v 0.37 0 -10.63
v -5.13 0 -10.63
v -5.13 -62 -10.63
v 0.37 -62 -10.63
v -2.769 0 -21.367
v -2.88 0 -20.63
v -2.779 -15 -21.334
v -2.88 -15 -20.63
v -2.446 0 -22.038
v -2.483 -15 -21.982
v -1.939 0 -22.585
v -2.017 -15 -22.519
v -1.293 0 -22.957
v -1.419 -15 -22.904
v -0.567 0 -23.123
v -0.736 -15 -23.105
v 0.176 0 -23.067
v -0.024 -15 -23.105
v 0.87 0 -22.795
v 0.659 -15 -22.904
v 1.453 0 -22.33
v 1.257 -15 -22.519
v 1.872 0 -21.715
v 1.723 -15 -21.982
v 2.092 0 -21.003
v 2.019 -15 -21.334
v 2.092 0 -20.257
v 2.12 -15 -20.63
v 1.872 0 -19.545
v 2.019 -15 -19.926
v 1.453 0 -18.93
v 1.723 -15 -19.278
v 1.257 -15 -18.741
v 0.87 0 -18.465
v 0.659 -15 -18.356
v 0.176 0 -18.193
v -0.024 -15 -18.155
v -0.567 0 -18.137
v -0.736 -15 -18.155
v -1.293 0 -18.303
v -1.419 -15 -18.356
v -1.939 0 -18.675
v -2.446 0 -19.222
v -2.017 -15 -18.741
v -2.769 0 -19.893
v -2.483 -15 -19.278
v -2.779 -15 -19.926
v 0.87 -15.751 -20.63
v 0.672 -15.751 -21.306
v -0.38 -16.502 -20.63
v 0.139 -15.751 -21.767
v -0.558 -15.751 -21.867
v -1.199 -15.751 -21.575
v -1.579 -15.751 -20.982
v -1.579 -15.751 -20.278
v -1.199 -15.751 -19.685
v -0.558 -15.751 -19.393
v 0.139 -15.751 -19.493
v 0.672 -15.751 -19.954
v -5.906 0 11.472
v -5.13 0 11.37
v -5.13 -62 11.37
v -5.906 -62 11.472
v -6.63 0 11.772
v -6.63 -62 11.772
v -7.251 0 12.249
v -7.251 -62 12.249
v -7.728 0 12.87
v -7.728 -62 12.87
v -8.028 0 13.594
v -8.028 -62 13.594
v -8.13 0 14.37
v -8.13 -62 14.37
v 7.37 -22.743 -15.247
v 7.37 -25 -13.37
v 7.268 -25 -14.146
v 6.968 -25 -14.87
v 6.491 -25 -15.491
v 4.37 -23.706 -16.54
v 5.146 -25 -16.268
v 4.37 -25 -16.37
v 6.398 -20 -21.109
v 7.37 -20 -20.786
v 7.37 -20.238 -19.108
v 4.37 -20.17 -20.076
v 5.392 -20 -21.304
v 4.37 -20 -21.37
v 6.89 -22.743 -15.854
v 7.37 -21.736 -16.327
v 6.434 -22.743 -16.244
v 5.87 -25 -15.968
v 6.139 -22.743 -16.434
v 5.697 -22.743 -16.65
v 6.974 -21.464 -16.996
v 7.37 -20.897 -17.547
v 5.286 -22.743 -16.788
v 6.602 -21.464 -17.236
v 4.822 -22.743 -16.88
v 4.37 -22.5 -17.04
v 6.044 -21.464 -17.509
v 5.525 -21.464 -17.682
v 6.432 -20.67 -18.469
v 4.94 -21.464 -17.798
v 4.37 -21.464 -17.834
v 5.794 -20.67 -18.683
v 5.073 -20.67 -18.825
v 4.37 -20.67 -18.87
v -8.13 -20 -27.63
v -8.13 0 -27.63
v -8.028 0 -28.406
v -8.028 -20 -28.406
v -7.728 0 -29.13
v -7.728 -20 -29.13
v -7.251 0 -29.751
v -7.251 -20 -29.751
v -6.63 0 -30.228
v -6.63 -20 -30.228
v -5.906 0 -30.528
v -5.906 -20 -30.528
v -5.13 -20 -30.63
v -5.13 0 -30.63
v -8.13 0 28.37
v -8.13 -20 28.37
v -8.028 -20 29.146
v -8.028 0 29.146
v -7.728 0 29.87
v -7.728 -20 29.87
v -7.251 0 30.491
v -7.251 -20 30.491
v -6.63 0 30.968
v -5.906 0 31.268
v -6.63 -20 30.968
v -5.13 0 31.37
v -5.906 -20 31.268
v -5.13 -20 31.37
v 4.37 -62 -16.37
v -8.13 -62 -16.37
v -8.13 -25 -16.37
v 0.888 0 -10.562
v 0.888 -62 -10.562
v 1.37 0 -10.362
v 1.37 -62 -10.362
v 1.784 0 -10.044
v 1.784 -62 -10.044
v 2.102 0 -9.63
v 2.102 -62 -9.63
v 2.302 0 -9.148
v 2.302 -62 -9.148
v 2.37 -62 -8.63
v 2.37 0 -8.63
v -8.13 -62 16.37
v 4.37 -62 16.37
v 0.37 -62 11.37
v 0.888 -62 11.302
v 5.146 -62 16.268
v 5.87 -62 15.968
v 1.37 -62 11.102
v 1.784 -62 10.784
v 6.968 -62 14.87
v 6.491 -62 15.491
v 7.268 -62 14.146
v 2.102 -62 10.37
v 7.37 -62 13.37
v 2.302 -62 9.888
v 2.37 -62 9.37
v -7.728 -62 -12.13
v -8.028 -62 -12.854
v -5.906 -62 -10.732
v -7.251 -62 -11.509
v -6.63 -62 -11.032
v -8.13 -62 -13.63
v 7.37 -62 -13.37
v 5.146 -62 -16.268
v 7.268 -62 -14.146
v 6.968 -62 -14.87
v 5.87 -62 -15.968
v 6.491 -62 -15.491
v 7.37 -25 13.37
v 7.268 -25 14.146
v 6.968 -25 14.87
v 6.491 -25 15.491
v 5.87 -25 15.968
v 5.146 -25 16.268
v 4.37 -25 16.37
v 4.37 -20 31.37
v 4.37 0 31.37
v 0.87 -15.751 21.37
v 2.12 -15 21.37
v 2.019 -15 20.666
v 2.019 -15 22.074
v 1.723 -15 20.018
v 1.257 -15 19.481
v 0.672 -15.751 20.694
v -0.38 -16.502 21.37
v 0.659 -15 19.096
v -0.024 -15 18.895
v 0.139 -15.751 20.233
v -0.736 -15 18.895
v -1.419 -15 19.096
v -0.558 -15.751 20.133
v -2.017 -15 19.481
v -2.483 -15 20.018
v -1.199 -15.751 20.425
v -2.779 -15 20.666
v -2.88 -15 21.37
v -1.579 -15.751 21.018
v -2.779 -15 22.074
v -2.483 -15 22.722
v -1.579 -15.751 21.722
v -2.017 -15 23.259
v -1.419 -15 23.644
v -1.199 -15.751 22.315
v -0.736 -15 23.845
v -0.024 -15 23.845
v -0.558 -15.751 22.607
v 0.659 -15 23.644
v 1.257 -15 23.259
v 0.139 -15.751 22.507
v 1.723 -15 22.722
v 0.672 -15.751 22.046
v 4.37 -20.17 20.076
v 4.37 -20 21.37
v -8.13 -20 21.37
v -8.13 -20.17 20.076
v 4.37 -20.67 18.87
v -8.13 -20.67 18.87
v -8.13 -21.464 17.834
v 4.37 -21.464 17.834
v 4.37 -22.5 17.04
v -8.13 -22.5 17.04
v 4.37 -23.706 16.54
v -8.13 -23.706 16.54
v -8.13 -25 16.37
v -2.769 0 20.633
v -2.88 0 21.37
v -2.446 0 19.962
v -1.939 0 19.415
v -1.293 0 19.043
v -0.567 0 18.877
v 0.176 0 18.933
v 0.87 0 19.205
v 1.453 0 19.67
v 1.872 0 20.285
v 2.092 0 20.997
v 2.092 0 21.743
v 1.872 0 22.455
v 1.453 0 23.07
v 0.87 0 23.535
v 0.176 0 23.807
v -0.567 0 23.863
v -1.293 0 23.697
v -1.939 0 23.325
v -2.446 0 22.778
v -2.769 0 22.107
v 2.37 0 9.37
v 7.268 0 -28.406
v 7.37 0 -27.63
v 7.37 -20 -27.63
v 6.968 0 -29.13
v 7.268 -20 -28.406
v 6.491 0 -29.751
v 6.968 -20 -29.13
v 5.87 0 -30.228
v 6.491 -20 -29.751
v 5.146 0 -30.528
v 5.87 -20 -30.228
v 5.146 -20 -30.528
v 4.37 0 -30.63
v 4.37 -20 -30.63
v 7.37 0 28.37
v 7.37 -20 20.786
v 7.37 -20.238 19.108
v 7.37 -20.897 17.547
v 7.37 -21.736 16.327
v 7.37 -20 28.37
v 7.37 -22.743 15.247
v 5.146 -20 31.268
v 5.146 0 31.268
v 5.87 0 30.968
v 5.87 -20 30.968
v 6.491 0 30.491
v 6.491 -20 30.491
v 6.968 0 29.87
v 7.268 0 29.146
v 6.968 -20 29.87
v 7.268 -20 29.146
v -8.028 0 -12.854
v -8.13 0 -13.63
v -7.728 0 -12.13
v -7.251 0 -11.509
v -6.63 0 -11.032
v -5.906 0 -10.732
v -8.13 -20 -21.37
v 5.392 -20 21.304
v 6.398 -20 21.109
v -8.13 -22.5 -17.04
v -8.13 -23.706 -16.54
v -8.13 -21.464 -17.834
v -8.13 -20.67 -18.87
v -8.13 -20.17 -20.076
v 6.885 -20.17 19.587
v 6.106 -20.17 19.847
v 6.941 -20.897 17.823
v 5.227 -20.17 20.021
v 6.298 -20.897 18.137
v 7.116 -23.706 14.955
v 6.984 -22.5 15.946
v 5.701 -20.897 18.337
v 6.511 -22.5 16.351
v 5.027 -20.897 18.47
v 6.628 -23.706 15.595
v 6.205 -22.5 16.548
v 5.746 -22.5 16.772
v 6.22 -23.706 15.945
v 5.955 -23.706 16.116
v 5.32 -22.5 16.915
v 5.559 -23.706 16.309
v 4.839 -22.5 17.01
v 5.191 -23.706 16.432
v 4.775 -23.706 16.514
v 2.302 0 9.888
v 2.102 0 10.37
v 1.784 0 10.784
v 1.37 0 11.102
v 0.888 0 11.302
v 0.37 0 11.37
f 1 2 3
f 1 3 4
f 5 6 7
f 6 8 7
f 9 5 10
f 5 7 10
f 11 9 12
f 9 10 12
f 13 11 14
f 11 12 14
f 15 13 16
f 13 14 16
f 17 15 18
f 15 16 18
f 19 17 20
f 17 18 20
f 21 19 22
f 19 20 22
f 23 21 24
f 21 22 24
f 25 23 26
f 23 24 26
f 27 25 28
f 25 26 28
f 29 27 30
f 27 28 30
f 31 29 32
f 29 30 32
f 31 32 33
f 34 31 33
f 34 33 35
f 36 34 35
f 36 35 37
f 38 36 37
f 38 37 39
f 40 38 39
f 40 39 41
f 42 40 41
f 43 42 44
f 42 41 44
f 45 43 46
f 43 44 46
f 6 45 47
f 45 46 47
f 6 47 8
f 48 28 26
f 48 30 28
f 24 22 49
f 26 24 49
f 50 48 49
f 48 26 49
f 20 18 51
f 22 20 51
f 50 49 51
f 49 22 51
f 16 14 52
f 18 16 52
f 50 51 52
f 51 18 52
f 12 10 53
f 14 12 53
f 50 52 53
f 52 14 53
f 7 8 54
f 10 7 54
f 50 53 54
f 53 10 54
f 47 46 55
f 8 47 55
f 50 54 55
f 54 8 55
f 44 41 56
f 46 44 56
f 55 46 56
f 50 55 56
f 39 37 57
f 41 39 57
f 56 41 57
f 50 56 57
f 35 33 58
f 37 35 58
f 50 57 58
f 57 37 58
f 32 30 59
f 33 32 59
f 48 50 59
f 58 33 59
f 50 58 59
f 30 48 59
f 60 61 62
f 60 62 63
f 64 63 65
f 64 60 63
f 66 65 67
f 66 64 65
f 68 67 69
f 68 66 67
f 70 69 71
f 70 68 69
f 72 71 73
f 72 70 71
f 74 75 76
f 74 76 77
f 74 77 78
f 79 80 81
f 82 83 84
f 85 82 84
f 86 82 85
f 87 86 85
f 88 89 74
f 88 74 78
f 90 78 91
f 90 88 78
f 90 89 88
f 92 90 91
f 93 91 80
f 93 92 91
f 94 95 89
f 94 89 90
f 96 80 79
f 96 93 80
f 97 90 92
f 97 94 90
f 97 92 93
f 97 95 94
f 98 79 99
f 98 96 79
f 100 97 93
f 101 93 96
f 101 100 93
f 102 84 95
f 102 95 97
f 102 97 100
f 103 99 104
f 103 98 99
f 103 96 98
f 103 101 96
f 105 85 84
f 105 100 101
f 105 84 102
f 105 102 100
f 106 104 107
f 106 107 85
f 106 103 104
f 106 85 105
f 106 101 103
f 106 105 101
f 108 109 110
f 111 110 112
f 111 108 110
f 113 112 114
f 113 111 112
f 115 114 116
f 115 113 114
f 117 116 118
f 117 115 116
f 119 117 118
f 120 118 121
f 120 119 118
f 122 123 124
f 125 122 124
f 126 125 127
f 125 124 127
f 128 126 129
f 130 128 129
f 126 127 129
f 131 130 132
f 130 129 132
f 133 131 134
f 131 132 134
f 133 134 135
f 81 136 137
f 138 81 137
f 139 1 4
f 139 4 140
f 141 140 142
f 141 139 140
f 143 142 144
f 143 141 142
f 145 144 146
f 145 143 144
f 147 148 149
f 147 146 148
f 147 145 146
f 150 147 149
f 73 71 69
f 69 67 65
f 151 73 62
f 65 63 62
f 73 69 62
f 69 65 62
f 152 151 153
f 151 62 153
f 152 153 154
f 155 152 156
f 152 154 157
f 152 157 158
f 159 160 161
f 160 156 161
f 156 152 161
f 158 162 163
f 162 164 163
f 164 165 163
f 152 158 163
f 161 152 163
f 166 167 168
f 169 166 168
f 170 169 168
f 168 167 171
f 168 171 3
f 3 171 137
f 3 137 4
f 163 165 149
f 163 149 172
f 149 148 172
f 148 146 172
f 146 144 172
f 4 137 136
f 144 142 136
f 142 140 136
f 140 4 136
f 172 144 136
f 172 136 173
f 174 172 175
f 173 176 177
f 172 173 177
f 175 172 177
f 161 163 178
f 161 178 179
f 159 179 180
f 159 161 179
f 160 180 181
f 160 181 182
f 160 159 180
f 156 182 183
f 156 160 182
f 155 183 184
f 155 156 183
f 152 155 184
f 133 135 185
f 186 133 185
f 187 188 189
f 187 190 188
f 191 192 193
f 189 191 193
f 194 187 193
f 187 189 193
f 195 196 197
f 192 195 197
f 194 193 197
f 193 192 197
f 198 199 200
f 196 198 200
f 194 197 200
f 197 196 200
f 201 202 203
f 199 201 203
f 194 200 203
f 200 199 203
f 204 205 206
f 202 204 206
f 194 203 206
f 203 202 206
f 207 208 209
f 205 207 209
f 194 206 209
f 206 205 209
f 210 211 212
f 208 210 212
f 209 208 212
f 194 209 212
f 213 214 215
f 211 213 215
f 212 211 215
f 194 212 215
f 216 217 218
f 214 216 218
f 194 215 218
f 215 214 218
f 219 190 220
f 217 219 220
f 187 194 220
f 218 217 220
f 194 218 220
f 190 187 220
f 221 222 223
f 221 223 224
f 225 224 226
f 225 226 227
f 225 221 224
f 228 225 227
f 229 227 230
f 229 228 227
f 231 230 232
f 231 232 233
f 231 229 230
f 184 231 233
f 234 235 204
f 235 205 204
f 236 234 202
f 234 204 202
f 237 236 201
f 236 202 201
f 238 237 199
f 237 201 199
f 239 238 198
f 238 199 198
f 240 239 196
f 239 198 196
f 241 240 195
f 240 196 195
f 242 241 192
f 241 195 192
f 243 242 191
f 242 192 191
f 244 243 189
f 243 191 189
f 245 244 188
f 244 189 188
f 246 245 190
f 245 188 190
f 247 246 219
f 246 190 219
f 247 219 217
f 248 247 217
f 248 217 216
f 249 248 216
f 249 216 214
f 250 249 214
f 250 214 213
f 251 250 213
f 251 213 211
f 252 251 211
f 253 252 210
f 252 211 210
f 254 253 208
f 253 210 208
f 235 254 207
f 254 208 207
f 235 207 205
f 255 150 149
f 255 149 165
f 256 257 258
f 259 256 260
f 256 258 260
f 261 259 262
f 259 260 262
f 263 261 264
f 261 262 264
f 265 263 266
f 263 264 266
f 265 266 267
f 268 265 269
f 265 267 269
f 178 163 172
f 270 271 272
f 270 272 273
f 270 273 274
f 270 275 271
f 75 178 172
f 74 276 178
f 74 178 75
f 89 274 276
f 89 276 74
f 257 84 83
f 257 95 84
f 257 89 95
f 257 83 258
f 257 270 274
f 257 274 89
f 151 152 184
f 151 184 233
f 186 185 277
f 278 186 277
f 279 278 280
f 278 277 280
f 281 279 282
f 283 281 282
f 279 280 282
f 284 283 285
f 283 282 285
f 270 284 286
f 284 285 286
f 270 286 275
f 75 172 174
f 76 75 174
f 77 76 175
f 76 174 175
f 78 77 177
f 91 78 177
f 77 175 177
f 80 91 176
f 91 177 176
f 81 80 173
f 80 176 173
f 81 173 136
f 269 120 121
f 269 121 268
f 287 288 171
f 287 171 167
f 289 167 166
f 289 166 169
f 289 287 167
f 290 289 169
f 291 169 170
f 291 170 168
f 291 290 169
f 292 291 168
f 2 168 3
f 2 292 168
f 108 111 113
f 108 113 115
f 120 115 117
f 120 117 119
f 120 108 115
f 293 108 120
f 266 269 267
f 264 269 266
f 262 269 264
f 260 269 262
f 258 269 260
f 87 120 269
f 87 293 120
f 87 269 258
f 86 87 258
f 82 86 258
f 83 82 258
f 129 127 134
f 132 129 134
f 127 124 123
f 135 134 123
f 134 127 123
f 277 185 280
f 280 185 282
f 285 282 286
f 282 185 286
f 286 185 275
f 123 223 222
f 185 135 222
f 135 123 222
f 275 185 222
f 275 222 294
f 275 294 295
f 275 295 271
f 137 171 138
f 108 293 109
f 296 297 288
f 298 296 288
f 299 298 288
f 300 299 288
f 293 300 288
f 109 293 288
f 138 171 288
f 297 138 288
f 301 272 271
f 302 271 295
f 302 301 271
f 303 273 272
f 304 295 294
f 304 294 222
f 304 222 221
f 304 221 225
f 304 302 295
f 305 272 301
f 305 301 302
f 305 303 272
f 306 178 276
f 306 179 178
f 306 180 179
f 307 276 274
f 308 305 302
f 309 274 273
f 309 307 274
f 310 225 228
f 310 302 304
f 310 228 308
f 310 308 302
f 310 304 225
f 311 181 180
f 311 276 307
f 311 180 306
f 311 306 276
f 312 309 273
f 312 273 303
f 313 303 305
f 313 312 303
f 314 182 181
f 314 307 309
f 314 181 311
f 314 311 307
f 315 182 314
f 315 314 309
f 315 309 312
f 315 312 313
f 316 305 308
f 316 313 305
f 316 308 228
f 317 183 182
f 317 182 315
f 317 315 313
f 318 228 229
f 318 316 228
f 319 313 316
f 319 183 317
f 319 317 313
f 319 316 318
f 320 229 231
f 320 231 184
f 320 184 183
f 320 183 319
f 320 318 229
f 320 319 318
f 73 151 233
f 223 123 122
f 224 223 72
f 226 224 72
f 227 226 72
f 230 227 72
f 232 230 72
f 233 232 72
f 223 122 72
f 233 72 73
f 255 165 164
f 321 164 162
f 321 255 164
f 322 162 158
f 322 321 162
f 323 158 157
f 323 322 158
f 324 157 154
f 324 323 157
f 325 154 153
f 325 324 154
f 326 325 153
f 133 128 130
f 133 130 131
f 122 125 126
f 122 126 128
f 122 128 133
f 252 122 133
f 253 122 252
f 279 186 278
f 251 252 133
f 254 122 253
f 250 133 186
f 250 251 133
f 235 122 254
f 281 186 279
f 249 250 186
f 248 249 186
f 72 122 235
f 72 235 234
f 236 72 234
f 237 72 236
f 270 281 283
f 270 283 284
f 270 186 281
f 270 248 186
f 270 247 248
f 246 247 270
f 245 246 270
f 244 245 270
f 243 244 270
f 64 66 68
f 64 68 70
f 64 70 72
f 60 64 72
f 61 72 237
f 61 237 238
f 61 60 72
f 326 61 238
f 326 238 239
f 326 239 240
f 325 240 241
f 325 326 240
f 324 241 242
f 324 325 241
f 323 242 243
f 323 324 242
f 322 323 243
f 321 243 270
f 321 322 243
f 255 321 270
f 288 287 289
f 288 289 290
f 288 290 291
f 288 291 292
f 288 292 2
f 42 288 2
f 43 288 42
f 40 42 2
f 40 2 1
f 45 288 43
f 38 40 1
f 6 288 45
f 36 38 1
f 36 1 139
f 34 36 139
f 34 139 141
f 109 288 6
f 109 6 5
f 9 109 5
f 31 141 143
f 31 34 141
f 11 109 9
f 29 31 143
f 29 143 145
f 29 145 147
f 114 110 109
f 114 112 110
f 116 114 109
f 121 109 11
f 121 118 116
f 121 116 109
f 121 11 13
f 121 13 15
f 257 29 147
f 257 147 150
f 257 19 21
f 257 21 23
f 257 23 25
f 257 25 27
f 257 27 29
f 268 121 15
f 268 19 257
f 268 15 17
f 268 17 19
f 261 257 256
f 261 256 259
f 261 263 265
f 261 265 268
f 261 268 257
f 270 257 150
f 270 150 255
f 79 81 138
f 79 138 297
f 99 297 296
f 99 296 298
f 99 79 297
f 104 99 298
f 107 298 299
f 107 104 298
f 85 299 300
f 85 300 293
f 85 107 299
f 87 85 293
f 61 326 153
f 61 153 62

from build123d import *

# Parameters (mm, degrees)
SKETCH1_W             = 15.5
SKETCH1_H             = 62
BOSS_EXTRUDE1_DEPTH   = 62
FILLET1_R             = 3
CUT_EXTRUDE1_REACH    = 71.958
CUT_EXTRUDE2_DEPTH    = 42
FILLET2_R             = 5
M6_TAPPED_HOLE1_D     = 5
M6_TAPPED_HOLE1_DEPTH = 15
M6_TAPPED_HOLE1_TIP   = 1.502151548


with BuildPart() as part:
    # Sketch1 → Boss-Extrude1 (new body)
    with BuildSketch(Plane(origin=(0, 0, 0), x_dir=(1, 0, 0), z_dir=(0, 1, 0))):
        with Locations((-0.38, -0.37)):
            Rectangle(SKETCH1_W, SKETCH1_H)
    extrude(amount=-BOSS_EXTRUDE1_DEPTH)

    # Fillet1
    fillet1_edges = [part.edges().sort_by_distance(p)[0] for p in [
        (7.37, -31, 31.37),
        (-8.13, -31, 31.37),
        (-8.13, -31, -30.63),
        (7.37, -31, -30.63),
    ]]
    fillet(fillet1_edges, radius=FILLET1_R)

    # Sketch2 → Cut-Extrude1 (cut, up to next)
    with BuildSketch(Plane(origin=(0, 0, 0), x_dir=(1, 0, 0), z_dir=(0, 1, 0)), mode=Mode.PRIVATE) as cut_extrude1_sk1:
        with BuildLine():
            Line((-5.13, 10.63), (0.37, 10.63))
            ThreePointArc((0.37, 10.63), (1.784213562, 10.044213562), (2.37, 8.63))
            Line((2.37, 8.63), (2.37, -9.37))
            ThreePointArc((2.37, -9.37), (1.784213562, -10.784213562), (0.37, -11.37))
            Line((0.37, -11.37), (-5.13, -11.37))
            ThreePointArc((-5.13, -11.37), (-7.251320344, -12.248679656), (-8.13, -14.37))
            Line((-8.13, -14.37), (-8.13, 13.63))
            ThreePointArc((-8.13, 13.63), (-7.251320344, 11.508679656), (-5.13, 10.63))
        make_face()
    cut_extrude1_tool1 = extrude(cut_extrude1_sk1.sketch, amount=-CUT_EXTRUDE1_REACH, mode=Mode.PRIVATE) & part.part
    add(cut_extrude1_tool1.solids().sort_by_distance((-2.991251, 0, 0.37))[0], mode=Mode.SUBTRACT)

    # Sketch3 → Cut-Extrude2 (cut)
    with BuildSketch(Plane(origin=(0, -62, 0), x_dir=(1, 0, 0), z_dir=(0, 1, 0))):
        with BuildLine():
            Line((4.37, -16.37), (-8.13, -16.37))
            Line((-8.13, -16.37), (-8.13, -28.37))
            ThreePointArc((-8.13, -28.37), (-7.251320344, -30.491320344), (-5.13, -31.37))
            Line((-5.13, -31.37), (4.37, -31.37))
            ThreePointArc((4.37, -31.37), (6.491320344, -30.491320344), (7.37, -28.37))
            Line((7.37, -28.37), (7.37, -13.37))
            ThreePointArc((7.37, -13.37), (6.491320344, -15.491320344), (4.37, -16.37))
        make_face()
    cut_extrude2 = extrude(amount=CUT_EXTRUDE2_DEPTH, mode=Mode.SUBTRACT)

    # Mirror1: Cut-Extrude2 across plane
    add(cut_extrude2.mirror(Plane.XY), mode=Mode.SUBTRACT)

    # Fillet2
    # the kernel refuses this fillet: 5 mm, written as the material it adds along each edge
    with BuildSketch(Plane(origin=(4.37, -20, -16.37), x_dir=(0, -1, 0), z_dir=(-1, 0, 0)), Plane(origin=(4.37, -20, 16.37), x_dir=(0, 0, 1), z_dir=(-1, 0, 0))) as fillet2_piece_1:
        with BuildLine():
            CenterArc((FILLET2_R, -FILLET2_R), FILLET2_R, 90, 90)
            Line((0, -FILLET2_R), (0, 0))
            Line((0, 0), (FILLET2_R, 0))
        make_face()
    extrude(amount=12.5)
    with BuildSketch(Plane(origin=(4.37, -20, -13.37), x_dir=(-0.5176042277799098, 0, -0.855620163030514), z_dir=(0.855620163030514, 0, -0.5176042277799098))) as fillet2_piece_2_section:
        with BuildLine():
            CenterArc((-3 - FILLET2_R, -FILLET2_R), FILLET2_R, 0, 90)
            Line((-3, -FILLET2_R), (-3, 0))
            Line((-3, 0), (-3 - FILLET2_R, 0))
        make_face()
    fillet2_piece_2 = revolve(axis=Axis((4.37, -20, -13.37), (0, 1, 0)), revolution_arc=328.828315396, mode=Mode.PRIVATE)
    fillet2_piece_2 = split(fillet2_piece_2, bisect_by=Plane(origin=(6.644254363, -21.721658314, -10.63), z_dir=(0, 0, -1)), keep=Keep.TOP, mode=Mode.PRIVATE)
    fillet2_piece_2 = split(fillet2_piece_2, bisect_by=Plane(origin=(7.37, -21.721658314, -15.644254458), z_dir=(-1, 0, 0)), keep=Keep.TOP, mode=Mode.PRIVATE)
    add(fillet2_piece_2)
    with BuildSketch(Plane(origin=(4.37, -20, 13.37), x_dir=(-0.5176042277799098, 0, 0.855620163030514), z_dir=(0.855620163030514, 0, 0.5176042277799098))) as fillet2_piece_3_section:
        with BuildLine():
            CenterArc((-3 - FILLET2_R, FILLET2_R), FILLET2_R, 270, 90)
            Line((-3, FILLET2_R), (-3, 0))
            Line((-3, 0), (-3 - FILLET2_R, 0))
        make_face()
    fillet2_piece_3 = revolve(axis=Axis((4.37, -20, 13.37), (0, -1, 0)), revolution_arc=328.828315396, mode=Mode.PRIVATE)
    fillet2_piece_3 = split(fillet2_piece_3, bisect_by=Plane(origin=(6.644254403, -21.721658525, 11.37), z_dir=(0, 0, 1)), keep=Keep.TOP, mode=Mode.PRIVATE)
    fillet2_piece_3 = split(fillet2_piece_3, bisect_by=Plane(origin=(7.37, -21.721658525, 15.644254403), z_dir=(-1, 0, 0)), keep=Keep.TOP, mode=Mode.PRIVATE)
    add(fillet2_piece_3)

    # M6 Tapped Hole1
    with Locations(Plane(origin=(0, 0, 0), x_dir=(1, 0, 0), z_dir=(0, 1, 0))):
        with Locations((-0.38, 20.63), (-0.38, -21.37)):
            Hole(M6_TAPPED_HOLE1_D / 2, depth=M6_TAPPED_HOLE1_DEPTH)
            with Locations((0, 0, -(M6_TAPPED_HOLE1_DEPTH + M6_TAPPED_HOLE1_TIP / 2))):  # 118° drill point
                Cone(0, M6_TAPPED_HOLE1_D / 2, M6_TAPPED_HOLE1_TIP, mode=Mode.SUBTRACT)


solid = part.part
